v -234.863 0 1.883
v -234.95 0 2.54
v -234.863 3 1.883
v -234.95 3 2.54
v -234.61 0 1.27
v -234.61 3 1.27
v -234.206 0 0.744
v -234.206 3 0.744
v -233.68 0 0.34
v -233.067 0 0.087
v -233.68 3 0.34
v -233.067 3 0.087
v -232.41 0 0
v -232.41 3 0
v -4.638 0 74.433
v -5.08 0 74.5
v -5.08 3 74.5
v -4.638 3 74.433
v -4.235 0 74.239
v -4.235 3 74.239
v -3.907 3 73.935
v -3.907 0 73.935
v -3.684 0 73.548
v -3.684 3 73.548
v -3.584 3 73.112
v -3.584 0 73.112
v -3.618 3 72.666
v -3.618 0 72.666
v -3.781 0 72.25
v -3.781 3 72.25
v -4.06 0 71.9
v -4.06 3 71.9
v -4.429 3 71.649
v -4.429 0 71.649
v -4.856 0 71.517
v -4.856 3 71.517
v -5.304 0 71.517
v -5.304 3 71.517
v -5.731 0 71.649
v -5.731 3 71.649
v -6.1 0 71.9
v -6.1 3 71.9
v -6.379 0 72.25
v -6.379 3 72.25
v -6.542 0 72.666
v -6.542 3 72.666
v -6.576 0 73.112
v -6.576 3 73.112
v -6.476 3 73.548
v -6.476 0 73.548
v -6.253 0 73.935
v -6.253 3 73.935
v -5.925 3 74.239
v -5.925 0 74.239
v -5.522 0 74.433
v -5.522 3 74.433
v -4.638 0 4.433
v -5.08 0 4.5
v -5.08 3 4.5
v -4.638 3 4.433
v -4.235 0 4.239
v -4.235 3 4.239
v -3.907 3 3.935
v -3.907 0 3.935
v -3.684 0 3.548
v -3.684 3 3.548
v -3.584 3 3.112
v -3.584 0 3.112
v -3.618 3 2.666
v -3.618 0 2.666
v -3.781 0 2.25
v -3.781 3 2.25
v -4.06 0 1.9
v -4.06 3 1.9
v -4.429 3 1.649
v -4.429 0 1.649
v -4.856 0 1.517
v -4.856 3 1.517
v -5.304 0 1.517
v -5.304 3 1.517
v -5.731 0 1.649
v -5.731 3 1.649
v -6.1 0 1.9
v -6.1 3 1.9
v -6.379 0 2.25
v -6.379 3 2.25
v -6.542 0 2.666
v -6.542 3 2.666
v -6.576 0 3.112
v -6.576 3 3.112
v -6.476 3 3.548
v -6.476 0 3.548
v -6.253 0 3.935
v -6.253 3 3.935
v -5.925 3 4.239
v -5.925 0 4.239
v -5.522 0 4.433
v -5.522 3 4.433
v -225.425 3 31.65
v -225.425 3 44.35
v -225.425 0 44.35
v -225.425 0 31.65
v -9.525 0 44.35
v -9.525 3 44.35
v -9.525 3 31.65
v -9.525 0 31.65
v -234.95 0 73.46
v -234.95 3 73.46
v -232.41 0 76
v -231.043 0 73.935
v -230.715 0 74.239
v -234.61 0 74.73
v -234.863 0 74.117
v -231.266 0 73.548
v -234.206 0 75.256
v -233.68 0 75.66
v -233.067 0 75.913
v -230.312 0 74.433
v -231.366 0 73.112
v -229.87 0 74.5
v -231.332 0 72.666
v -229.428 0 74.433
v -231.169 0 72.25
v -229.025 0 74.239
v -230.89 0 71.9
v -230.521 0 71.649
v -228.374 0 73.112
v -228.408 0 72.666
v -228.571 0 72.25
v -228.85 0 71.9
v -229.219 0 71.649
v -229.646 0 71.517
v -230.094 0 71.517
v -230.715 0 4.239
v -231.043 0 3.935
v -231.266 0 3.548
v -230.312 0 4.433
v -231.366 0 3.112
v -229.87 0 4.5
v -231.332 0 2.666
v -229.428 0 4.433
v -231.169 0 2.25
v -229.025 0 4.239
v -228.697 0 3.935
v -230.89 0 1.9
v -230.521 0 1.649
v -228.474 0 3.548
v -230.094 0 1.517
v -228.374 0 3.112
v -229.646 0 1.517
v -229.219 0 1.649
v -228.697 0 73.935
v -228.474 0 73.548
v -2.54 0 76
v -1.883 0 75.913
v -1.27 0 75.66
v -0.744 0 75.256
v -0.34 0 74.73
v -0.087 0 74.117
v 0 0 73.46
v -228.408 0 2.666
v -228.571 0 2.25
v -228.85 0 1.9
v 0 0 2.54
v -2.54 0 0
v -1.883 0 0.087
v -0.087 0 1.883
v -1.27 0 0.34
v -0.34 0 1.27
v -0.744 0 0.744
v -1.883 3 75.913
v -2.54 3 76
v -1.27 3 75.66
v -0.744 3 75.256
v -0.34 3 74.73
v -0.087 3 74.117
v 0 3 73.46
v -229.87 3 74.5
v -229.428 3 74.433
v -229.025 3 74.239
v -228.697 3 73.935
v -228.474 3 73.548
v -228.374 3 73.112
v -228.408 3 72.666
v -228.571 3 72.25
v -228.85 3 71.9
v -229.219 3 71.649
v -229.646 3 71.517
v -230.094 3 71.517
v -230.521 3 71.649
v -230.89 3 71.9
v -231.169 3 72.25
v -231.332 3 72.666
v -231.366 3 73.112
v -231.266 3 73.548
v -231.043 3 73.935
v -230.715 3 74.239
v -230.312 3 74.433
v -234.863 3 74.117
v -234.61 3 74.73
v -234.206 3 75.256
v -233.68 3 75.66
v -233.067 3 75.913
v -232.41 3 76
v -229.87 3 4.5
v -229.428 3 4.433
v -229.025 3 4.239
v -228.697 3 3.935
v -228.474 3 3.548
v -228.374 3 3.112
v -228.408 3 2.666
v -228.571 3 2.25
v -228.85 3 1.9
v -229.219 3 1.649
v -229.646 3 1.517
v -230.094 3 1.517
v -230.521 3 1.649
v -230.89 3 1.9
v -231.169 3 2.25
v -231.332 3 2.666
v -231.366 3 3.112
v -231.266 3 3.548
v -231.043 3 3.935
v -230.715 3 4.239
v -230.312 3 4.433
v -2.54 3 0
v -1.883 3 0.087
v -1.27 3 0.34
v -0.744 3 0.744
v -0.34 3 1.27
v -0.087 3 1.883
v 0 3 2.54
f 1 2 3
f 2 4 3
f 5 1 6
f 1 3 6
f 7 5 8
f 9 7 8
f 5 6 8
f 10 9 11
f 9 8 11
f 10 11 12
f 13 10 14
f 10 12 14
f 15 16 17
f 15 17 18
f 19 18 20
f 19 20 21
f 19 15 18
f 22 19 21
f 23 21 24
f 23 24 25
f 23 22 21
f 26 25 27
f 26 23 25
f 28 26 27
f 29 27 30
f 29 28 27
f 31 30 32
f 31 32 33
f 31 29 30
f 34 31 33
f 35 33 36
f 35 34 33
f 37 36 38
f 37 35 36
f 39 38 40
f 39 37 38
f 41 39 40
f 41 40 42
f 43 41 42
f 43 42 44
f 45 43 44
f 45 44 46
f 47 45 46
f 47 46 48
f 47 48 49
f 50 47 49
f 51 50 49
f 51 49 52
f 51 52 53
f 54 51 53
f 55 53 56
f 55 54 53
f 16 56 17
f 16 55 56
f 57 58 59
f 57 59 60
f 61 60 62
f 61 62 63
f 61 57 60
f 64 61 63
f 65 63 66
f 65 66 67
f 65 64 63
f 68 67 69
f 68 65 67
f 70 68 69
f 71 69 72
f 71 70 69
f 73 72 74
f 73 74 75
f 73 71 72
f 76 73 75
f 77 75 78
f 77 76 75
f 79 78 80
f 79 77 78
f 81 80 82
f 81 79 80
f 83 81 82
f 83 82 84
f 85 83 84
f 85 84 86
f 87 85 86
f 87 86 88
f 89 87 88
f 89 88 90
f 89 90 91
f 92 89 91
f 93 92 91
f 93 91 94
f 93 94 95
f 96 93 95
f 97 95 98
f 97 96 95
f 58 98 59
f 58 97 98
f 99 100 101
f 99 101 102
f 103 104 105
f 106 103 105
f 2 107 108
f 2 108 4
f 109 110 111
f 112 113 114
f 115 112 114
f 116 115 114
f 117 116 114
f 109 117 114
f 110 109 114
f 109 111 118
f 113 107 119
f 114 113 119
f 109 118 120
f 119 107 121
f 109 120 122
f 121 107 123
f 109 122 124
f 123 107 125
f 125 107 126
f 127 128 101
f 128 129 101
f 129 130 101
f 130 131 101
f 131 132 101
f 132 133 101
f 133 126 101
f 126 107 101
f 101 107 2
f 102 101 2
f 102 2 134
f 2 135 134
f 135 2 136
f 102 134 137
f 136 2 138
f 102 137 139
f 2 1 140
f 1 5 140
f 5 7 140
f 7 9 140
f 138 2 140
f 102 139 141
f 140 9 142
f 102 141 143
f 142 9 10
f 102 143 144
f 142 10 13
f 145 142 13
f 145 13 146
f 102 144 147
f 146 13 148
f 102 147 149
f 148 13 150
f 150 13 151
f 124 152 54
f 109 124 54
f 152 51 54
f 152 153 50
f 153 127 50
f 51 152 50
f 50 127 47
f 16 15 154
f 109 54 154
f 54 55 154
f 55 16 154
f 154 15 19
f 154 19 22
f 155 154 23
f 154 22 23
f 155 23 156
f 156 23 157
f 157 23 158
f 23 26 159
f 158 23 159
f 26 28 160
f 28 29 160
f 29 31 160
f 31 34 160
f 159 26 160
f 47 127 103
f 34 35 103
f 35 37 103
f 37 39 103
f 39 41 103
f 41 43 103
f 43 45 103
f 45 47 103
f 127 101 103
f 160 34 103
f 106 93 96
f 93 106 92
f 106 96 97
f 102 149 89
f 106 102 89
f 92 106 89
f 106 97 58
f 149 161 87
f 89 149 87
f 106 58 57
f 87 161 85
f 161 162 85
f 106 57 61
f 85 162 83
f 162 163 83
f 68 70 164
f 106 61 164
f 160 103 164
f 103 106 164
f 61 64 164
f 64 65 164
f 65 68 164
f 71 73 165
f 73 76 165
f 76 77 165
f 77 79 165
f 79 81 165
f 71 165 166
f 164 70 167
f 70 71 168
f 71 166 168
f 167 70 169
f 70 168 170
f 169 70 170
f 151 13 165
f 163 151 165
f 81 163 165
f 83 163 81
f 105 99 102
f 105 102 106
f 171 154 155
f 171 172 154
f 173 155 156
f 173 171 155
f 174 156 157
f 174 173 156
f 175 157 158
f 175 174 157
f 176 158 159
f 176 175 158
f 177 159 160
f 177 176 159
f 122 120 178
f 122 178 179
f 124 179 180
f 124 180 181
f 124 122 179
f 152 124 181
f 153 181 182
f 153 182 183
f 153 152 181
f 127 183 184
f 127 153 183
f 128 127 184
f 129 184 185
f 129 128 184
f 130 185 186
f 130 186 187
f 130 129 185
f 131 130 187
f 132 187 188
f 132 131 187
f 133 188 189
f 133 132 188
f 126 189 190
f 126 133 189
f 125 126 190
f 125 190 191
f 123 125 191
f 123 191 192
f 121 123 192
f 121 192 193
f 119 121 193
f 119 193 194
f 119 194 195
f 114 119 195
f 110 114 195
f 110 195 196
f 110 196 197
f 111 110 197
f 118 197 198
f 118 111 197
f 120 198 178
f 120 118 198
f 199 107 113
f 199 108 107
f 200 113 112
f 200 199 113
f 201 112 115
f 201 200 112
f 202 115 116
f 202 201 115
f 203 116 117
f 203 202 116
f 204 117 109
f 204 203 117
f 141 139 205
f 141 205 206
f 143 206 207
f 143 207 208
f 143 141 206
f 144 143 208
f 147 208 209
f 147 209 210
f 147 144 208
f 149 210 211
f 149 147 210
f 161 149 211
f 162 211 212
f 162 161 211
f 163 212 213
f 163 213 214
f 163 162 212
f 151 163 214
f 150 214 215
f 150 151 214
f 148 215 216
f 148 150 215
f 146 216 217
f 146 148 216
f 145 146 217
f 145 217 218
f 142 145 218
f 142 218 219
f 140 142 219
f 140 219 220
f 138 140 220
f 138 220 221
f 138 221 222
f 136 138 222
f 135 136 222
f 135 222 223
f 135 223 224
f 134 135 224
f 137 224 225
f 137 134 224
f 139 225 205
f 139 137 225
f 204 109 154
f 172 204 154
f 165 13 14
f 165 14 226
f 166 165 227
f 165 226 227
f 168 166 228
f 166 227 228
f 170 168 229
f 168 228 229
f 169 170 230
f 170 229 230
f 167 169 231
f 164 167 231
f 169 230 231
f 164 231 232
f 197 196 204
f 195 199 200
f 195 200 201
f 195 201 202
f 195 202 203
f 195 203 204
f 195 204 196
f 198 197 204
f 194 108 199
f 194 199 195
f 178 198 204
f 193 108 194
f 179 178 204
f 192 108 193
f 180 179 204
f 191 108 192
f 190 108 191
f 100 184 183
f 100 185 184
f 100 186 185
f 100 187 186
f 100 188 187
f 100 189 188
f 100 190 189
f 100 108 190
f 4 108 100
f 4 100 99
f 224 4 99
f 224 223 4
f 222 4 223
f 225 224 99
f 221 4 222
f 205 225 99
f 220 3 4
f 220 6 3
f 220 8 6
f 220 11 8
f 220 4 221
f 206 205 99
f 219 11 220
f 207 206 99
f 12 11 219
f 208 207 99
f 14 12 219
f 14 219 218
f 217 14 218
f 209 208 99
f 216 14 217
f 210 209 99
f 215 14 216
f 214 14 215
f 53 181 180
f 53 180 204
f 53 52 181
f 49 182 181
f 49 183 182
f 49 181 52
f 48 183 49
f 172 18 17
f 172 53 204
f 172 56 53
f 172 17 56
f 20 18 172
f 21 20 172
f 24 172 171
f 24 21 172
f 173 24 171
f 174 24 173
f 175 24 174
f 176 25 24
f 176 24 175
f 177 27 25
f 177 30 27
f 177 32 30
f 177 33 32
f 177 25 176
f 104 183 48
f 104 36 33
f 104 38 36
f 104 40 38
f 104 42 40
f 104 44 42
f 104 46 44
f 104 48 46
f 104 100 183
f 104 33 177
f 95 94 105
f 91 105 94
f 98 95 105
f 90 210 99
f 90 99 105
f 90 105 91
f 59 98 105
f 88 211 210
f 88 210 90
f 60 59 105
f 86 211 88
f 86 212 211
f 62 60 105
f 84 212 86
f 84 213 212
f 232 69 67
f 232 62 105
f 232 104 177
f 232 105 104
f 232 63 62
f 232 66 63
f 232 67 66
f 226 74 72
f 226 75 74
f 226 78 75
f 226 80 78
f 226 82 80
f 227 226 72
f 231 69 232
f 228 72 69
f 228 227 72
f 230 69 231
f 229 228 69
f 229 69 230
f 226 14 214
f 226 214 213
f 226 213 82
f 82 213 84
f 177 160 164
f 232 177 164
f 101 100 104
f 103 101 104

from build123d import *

# Parameters (mm, degrees)
SKETCH3_W           = 234.95
SKETCH3_H           = 76
SKETCH3_R           = 1.5
BOSS_EXTRUDE4_DEPTH = 3
SKETCH4_W           = 215.9
SKETCH4_H           = 12.7
CUT_EXTRUDE1_DEPTH  = 3.81
FILLET11_R          = 2.54


with BuildPart() as part:
    # Sketch3 → Boss-Extrude4 (new body)
    with BuildSketch(Plane(origin=(0, 0, 0), x_dir=(1, 0, 0), z_dir=(0, 1, 0))):
        with Locations((-117.475, -38)):
            Rectangle(SKETCH3_W, SKETCH3_H)
        with Locations(Location((-5.08, -3, 0), (0, 0, 270))):
            Circle(SKETCH3_R, mode=Mode.SUBTRACT)
        with Locations(Location((-5.08, -73, 0), (0, 0, 270))):
            Circle(SKETCH3_R, mode=Mode.SUBTRACT)
        with Locations(Location((-229.87, -73, 0), (0, 0, 270))):
            Circle(SKETCH3_R, mode=Mode.SUBTRACT)
        with Locations(Location((-229.87, -3, 0), (0, 0, 270))):
            Circle(SKETCH3_R, mode=Mode.SUBTRACT)
    extrude(amount=BOSS_EXTRUDE4_DEPTH)

    # Sketch4 → Cut-Extrude1 (cut)
    with BuildSketch(Plane(origin=(0, 3, 0), x_dir=(1, 0, 0), z_dir=(0, 1, 0))):
        with Locations((-117.475, -38)):
            Rectangle(SKETCH4_W, SKETCH4_H)
    extrude(amount=-CUT_EXTRUDE1_DEPTH, mode=Mode.SUBTRACT)

    # Fillet11
    fillet11_edges = [part.edges().sort_by_distance(p)[0] for p in [
        (-234.95, 1.5, 0),
        (0, 1.5, 0),
        (0, 1.5, 76),
        (-234.95, 1.5, 76),
    ]]
    fillet(fillet11_edges, radius=FILLET11_R)


solid = part.part
